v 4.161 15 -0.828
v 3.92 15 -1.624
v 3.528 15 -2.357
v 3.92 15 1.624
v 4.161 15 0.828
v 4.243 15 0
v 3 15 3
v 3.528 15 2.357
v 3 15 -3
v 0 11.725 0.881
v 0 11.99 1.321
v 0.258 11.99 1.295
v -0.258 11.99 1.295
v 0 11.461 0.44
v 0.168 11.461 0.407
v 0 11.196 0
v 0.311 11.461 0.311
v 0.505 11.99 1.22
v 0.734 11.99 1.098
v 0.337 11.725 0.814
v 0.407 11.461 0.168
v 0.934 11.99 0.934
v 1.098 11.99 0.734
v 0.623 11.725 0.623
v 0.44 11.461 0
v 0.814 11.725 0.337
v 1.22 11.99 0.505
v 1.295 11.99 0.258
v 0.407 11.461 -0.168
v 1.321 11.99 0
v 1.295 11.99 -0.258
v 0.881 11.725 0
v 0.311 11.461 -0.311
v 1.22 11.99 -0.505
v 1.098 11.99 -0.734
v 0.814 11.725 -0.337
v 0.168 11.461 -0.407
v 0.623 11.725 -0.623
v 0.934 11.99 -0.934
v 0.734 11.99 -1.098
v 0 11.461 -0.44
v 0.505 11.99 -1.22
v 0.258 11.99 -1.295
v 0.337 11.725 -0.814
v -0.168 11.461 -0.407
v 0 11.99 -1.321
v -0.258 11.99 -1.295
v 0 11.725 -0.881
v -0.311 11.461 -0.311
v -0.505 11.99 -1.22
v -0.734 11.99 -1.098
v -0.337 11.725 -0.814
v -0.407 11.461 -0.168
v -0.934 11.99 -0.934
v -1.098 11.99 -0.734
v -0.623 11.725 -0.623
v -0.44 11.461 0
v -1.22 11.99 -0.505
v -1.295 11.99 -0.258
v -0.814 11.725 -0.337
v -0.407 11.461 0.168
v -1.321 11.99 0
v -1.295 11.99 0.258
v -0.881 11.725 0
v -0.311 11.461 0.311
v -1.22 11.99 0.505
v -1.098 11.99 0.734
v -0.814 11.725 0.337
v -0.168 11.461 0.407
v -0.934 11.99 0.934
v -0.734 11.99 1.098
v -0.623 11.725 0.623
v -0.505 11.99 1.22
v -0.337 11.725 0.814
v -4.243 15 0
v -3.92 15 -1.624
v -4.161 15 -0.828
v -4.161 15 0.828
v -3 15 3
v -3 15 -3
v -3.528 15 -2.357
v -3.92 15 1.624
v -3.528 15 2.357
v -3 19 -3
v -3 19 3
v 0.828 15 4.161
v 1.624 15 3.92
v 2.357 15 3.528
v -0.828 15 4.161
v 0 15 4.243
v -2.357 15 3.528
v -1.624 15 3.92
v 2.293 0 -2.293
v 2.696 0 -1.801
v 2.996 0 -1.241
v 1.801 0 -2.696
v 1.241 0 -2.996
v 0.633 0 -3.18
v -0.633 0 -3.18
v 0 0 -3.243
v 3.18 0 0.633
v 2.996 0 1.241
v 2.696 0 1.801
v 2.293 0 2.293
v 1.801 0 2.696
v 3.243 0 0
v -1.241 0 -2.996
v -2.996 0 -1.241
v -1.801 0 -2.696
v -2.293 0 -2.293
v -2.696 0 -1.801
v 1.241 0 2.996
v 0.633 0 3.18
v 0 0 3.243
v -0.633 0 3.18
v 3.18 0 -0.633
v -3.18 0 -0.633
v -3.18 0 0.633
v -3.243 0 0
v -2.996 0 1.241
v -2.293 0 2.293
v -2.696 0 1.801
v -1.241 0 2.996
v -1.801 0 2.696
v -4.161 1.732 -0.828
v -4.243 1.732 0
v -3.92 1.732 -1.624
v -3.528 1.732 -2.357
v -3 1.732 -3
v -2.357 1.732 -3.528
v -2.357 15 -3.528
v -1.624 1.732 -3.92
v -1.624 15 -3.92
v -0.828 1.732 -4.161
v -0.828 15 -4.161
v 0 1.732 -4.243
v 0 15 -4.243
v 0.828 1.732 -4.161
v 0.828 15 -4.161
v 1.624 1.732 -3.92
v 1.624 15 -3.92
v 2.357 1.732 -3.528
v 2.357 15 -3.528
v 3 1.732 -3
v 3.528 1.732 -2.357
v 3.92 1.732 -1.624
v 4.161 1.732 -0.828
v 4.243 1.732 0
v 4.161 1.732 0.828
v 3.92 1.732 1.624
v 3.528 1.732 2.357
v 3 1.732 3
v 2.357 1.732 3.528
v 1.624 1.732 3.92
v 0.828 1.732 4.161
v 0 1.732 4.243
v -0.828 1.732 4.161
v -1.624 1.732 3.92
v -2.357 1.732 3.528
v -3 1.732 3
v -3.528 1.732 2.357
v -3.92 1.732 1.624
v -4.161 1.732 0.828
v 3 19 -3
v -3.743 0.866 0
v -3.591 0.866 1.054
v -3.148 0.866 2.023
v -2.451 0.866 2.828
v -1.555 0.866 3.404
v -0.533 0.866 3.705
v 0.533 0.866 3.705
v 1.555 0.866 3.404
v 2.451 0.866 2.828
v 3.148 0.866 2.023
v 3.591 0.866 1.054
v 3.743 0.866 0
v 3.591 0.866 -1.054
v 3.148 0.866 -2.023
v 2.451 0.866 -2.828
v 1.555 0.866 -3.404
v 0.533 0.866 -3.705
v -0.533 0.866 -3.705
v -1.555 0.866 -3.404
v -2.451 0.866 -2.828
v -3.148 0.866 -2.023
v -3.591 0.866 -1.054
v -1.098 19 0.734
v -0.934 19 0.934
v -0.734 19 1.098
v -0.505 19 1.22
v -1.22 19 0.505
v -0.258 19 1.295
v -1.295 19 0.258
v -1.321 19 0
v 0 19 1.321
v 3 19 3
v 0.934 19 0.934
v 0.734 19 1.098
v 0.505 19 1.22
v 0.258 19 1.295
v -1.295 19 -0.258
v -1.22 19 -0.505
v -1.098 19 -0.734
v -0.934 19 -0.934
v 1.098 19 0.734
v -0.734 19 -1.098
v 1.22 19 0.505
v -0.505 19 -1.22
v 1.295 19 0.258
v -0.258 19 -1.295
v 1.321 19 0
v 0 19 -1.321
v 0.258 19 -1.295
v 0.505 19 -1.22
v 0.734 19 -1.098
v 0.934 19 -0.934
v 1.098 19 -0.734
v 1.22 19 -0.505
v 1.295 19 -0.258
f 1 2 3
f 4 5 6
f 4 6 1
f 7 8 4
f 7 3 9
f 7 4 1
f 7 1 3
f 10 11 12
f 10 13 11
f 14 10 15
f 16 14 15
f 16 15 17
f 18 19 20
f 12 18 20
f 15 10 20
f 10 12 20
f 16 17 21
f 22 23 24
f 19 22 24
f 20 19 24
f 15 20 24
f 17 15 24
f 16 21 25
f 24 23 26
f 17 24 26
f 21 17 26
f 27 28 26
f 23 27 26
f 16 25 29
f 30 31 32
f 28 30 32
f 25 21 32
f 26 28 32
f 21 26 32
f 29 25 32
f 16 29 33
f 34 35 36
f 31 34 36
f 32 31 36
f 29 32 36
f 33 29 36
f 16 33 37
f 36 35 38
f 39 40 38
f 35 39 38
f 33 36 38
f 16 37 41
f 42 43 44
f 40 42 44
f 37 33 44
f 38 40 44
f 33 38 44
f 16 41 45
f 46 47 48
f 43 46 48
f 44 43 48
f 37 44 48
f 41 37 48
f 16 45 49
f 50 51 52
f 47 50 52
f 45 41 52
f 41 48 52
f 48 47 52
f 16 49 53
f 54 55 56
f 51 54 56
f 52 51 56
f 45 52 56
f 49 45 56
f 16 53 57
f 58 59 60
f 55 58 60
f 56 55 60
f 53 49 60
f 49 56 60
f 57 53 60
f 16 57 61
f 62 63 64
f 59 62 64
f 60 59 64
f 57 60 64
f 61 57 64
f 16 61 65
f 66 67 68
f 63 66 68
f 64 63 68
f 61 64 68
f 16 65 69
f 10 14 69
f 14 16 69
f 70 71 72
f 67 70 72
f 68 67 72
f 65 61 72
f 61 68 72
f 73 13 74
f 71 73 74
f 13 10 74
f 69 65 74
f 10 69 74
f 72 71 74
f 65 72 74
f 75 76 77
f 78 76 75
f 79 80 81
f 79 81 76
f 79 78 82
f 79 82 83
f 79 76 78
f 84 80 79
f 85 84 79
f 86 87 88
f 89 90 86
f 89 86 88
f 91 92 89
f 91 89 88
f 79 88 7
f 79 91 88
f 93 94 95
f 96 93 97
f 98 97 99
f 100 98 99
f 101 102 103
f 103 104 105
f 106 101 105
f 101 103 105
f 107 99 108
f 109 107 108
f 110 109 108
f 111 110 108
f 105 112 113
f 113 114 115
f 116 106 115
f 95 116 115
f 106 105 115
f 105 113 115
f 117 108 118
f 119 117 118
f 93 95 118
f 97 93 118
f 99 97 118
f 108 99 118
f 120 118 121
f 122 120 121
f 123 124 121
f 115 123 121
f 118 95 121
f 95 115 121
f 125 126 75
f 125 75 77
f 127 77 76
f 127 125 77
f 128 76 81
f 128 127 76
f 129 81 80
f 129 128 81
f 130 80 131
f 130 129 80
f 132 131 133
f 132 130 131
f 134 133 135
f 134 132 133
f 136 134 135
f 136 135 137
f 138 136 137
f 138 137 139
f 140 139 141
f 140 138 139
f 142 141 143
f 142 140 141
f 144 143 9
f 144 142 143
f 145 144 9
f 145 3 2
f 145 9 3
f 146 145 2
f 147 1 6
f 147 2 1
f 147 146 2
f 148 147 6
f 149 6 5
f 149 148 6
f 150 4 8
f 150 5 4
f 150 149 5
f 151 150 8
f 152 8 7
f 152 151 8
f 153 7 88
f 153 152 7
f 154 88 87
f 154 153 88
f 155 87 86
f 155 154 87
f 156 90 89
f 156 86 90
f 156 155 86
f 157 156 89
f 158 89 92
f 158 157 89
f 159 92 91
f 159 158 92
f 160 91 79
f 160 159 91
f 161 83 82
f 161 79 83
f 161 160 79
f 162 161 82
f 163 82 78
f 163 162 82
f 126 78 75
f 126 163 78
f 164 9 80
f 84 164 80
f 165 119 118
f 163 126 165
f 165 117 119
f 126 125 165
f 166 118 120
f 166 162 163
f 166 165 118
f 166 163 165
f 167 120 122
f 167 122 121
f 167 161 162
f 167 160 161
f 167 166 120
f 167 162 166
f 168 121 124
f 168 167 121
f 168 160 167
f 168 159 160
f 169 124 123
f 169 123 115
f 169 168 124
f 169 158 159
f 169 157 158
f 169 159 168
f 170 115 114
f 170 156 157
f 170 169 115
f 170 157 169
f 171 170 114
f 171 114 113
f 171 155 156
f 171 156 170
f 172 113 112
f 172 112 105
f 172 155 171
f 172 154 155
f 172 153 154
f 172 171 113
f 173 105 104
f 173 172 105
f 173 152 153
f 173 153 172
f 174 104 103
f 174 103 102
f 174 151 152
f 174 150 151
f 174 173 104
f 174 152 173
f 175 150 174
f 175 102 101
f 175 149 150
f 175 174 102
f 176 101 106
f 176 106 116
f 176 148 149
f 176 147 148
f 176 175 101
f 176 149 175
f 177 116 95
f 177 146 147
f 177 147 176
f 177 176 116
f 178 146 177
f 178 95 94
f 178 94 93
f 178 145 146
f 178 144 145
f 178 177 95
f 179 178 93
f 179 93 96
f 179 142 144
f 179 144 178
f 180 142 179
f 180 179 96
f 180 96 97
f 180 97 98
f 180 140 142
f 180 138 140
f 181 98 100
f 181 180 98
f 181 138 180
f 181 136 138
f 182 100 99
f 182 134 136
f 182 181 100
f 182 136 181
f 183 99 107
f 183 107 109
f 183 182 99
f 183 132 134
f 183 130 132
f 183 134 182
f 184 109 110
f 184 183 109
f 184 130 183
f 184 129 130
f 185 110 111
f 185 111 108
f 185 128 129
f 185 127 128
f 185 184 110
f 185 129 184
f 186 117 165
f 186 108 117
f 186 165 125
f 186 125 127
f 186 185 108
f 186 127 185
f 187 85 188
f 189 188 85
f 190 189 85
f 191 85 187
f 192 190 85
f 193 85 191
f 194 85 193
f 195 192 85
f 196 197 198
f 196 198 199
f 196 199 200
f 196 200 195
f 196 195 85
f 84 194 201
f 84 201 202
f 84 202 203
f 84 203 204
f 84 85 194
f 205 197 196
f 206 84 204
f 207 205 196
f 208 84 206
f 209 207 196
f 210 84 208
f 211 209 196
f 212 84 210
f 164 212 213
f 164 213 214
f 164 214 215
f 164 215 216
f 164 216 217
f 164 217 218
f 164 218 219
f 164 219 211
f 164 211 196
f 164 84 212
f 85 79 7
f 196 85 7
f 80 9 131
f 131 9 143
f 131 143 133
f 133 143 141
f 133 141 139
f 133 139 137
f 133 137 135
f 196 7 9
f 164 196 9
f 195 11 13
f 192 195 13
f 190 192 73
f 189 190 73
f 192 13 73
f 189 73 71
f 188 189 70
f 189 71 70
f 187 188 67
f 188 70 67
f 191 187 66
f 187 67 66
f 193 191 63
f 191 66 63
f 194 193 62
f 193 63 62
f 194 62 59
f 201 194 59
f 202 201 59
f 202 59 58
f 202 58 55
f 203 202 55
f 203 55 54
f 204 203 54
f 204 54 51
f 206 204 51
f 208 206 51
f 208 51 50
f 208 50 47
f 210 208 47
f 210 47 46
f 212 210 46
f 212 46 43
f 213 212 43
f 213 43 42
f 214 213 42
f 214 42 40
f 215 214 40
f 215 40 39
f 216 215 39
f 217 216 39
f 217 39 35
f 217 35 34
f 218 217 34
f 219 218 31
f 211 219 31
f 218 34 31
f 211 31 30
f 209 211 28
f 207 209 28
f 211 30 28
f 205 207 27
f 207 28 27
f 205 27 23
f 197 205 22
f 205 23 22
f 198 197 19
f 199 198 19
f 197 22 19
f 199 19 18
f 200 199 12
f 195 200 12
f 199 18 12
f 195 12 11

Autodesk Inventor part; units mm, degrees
ref_plane "YZ Plane" through (0, 0, 0) normal (1, 0, 0) x (0, 1, 0)
ref_plane "XZ Plane" through (0, 0, 0) normal (0, 1, 0) x (-1, 0, 0)
ref_plane "XY Plane" through (0, 0, 0) normal (0, 0, 1) x (1, 0, 0)
sketch "Sketch1" plane through (0, 0, 0) normal (0, 1, 0) x (-1, 0, 0)
  line L0 (3, 3) -> (-3, 3) construction
  line L1 (-3, 3) -> (-3, -3) construction
  line L2 (-3, -3) -> (3, -3) construction
  line L3 (3, -3) -> (3, 3) construction
  circle A0 centre (0, 0) radius 4.2426
  dimension "d2" = 6
  dimension "d3" = 6
  dimension "d4" = 3
  dimension "d5" = 3
extrude "Extrusion1" add sketch "Sketch1" along normal blind 15
sketch "Sketch2" plane through (0, 15, 0) normal (0, 1, 0) x (1, 0, 0)
  line L0 (-3, -3) -> (3, -3)
  line L1 (3, -3) -> (3, 3)
  line L2 (3, 3) -> (-3, 3)
  line L3 (-3, 3) -> (-3, -3)
  circle A0 centre (0, 0) radius 4.2426 projected
  dimension "d8" = 6
  dimension "d9" = 6
  dimension "d22" = 3
extrude "Extrusion2" add sketch "Sketch2" along normal blind 4 contours L3 L2 L1 L0
chamfer "Chamfer1" distance 1 angle 60 1 edges at (4.2426, 0, 0) measured on face at (-1.1052, 0, 1.3223)
sketch "Sketch4" plane through (0, 19, 0) normal (0, 1, 0) x (1, 0, 0)
  point P0 (0, 0)
  point P1 (0, 0)
hole "Hole2" at (0, 19, 0) direction (0, -1, 0) diameter 2.6416 depth 7.01 tip angle 118 thread size "6-32 UNC" class "2B" standard "ANSI Unified Screw Threads"
properties part number "motor_shaft"
